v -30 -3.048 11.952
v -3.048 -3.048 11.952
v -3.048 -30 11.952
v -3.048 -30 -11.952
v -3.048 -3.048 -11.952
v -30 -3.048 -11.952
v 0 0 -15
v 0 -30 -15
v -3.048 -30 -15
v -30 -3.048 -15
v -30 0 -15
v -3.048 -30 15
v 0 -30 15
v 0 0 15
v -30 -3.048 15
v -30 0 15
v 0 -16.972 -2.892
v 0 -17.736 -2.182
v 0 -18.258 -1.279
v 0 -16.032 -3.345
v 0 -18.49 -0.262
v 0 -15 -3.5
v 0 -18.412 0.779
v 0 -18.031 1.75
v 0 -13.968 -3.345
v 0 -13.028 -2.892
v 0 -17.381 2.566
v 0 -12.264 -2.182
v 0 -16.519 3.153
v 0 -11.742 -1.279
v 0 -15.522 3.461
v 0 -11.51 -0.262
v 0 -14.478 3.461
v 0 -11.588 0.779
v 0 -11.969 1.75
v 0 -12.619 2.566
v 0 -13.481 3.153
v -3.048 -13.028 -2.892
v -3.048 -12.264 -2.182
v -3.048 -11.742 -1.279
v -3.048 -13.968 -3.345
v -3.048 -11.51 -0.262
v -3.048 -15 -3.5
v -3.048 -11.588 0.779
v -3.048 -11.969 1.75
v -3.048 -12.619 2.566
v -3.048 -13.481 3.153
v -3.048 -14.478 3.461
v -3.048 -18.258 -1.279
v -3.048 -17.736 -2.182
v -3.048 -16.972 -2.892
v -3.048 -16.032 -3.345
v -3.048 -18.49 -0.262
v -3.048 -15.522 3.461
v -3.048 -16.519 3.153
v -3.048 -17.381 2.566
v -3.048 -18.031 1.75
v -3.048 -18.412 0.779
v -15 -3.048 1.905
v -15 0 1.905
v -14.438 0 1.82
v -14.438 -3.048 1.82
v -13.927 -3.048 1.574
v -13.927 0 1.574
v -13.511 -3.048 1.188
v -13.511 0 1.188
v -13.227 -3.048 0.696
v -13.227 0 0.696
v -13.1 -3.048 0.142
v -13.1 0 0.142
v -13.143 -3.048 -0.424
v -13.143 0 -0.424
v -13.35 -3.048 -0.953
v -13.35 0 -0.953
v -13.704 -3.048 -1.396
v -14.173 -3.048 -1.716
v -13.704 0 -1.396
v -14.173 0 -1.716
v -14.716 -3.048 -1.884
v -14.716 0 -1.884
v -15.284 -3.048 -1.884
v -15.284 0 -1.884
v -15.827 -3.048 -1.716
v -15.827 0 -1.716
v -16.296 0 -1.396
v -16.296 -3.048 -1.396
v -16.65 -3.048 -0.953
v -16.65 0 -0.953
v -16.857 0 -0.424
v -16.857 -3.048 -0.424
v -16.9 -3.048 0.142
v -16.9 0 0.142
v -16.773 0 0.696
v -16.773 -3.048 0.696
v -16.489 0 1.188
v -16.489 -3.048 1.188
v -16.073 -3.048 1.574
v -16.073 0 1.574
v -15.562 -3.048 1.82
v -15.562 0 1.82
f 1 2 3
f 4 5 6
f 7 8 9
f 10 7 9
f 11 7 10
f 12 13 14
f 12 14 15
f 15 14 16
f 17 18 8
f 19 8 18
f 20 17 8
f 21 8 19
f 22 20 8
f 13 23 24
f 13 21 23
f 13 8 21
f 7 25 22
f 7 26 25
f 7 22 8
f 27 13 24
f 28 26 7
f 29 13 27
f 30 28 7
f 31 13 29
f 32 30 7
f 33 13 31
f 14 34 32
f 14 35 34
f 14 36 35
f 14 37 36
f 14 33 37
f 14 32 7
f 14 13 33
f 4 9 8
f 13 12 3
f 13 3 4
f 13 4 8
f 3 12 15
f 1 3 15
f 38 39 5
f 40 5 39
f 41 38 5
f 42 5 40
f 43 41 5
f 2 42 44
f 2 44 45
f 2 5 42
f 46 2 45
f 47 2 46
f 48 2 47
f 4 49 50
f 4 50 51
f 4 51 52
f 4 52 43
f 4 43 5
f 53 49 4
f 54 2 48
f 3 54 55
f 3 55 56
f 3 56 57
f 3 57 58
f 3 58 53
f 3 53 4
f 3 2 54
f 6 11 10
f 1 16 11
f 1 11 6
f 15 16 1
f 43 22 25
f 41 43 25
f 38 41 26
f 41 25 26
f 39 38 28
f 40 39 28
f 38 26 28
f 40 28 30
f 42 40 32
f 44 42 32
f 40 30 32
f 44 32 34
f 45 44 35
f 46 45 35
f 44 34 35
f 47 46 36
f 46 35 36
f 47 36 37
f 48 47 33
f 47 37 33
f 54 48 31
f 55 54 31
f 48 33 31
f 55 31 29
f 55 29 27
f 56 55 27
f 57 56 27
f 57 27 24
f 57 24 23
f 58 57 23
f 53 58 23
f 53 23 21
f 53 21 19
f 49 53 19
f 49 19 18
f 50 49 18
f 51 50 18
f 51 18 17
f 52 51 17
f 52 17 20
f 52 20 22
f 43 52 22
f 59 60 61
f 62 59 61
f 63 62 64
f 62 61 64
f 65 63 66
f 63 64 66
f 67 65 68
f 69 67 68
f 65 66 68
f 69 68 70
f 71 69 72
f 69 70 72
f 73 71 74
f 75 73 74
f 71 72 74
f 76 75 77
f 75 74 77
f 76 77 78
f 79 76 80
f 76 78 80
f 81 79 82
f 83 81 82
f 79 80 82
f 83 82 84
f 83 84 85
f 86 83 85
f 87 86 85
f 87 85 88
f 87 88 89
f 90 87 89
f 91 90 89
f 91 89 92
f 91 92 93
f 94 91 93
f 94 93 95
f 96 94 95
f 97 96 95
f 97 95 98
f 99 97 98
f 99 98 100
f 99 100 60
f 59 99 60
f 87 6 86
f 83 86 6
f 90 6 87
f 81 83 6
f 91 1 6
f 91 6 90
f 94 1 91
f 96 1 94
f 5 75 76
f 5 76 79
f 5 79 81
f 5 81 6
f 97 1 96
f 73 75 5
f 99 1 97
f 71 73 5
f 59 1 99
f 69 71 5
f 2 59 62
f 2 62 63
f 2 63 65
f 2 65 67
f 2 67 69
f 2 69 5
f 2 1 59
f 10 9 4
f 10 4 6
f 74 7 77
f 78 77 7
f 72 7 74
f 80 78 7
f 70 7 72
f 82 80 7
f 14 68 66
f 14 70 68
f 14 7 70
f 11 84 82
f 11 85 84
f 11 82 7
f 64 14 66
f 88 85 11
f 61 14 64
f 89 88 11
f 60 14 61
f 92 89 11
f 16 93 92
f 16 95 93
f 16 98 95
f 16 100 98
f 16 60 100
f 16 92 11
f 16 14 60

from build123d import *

# Parameters (mm, degrees)
BOSS_EXTRUDE1_DEPTH = 15
BOSS_EXTRUDE2_START = 15
BOSS_EXTRUDE2_DEPTH = 3.048
BOSS_EXTRUDE3_START = -15
BOSS_EXTRUDE3_DEPTH = 3.048
SKETCH2_R           = 1.905
CUT_EXTRUDE1_DEPTH  = 46
SKETCH3_R           = 3.5
CUT_EXTRUDE2_DEPTH  = 46


with BuildPart() as part:
    # Sketch1 → Boss-Extrude1 (new, symmetric)
    with BuildSketch(Plane.XY):
        Polygon((-3.048, -30), (0, -30), (0, 0), (-30, 0), (-30, -3.048), (-3.048, -3.048), align=None)
    extrude(amount=BOSS_EXTRUDE1_DEPTH, both=True)

    # Sketch1<3> → Boss-Extrude2 (add)
    with BuildSketch(Plane.XY.offset(BOSS_EXTRUDE2_START)):
        Polygon((-3.048, -30), (-30, -3.048), (-3.048, -3.048), align=None)
    extrude(amount=-BOSS_EXTRUDE2_DEPTH)

    # Sketch1<4> → Boss-Extrude3 (add)
    with BuildSketch(Plane.XY.offset(BOSS_EXTRUDE3_START)):
        Polygon((-3.048, -30), (-30, -3.048), (-3.048, -3.048), align=None)
    extrude(amount=BOSS_EXTRUDE3_DEPTH)

    # Sketch2 → Cut-Extrude1 (cut, through all)
    with BuildSketch(Plane(origin=(0, 0, 0), x_dir=(1, 0, 0), z_dir=(0, 1, 0))):
        with Locations(Location((-15, 0, 0), (0, 0, 270))):
            Circle(SKETCH2_R)
    extrude(amount=-CUT_EXTRUDE1_DEPTH, mode=Mode.SUBTRACT)

    # Sketch3 → Cut-Extrude2 (cut, through all)
    with BuildSketch(Plane(origin=(0, 0, 0), x_dir=(0, 0, -1), z_dir=(1, 0, 0))):
        with Locations((0, -15)):
            Circle(SKETCH3_R)
    extrude(amount=-CUT_EXTRUDE2_DEPTH, mode=Mode.SUBTRACT)


solid = part.part
